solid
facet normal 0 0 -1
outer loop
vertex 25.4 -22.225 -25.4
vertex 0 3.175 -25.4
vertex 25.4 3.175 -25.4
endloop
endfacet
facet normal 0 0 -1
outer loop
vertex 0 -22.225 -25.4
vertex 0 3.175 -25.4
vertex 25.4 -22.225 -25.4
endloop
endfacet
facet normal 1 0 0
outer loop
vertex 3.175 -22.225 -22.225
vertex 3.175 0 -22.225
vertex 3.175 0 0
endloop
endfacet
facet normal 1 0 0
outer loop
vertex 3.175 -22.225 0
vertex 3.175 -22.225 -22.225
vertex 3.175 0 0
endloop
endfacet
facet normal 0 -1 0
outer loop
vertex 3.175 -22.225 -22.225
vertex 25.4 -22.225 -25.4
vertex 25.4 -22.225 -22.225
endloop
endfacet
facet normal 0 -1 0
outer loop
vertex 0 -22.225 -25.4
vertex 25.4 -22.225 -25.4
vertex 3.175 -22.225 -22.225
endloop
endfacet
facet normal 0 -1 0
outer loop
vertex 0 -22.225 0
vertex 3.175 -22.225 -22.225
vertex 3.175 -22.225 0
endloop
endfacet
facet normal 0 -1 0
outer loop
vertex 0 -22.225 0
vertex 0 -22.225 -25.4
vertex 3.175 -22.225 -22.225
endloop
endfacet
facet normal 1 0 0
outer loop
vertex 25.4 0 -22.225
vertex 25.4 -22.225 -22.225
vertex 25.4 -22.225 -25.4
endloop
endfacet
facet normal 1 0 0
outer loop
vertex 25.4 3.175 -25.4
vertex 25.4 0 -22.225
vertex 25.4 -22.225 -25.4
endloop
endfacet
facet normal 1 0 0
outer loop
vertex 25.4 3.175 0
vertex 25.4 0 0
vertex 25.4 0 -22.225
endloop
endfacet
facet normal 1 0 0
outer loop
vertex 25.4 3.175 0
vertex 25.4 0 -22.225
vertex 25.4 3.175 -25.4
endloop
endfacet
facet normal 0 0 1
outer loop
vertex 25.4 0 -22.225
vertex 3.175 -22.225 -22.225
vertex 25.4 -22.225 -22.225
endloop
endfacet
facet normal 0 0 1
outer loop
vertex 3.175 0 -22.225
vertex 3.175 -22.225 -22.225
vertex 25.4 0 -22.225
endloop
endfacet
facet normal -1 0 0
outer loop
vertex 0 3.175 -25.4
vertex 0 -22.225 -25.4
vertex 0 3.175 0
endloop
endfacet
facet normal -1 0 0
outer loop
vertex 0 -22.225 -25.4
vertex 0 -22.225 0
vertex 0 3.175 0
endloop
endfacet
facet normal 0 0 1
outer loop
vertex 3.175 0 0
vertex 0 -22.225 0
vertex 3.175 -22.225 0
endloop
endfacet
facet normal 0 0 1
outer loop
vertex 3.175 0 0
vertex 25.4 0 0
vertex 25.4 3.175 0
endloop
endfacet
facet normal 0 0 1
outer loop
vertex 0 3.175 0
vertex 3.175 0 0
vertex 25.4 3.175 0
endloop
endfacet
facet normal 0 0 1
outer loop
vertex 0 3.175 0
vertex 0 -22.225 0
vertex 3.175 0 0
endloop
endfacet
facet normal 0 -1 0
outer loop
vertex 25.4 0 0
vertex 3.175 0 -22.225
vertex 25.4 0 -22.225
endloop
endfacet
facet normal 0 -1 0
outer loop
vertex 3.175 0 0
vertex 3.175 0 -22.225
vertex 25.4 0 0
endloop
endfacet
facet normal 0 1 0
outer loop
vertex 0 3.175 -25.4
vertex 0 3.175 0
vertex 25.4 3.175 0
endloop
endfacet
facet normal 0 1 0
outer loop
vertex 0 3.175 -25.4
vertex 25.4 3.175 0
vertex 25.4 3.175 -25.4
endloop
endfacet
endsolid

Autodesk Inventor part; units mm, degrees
ref_plane "YZ Plane" through (0, 0, 0) normal (1, 0, 0) x (0, 1, 0)
ref_plane "XZ Plane" through (0, 0, 0) normal (0, 1, 0) x (-1, 0, 0)
ref_plane "XY Plane" through (0, 0, 0) normal (0, 0, 1) x (1, 0, 0)
sketch "Sketch1" plane through (0, 0, 0) normal (1, 0, 0) x (0, 1, 0)
  line L0 (0, 0) -> (3.175, 0)
  line L1 (3.175, 0) -> (3.175, -25.4)
  line L2 (3.175, -25.4) -> (-22.225, -25.4)
  line L3 (-22.225, -25.4) -> (-22.225, -22.225)
  line L4 (-22.225, -22.225) -> (0, -22.225)
  line L5 (0, -22.225) -> (0, 0)
  dimension "d0" = 3.175
  dimension "d1" = 3.175
  dimension "d2" = 25.4
  dimension "d3" = 25.4
extrude "Extrusion1" add sketch "Sketch1" along normal blind 25.4
sketch "Sketch2" plane through (0, 0, 0) normal (-1, 0, 0) x (0, 0, 1)
  line L0 (-25.4, -22.225) -> (-25.4, 3.175) projected
  line L1 (-25.4, 3.175) -> (0, 3.175)
  line L2 (0, 3.175) -> (0, -22.225)
  line L3 (0, -22.225) -> (-25.4, -22.225)
  line L4 (-25.4, -22.225) -> (-25.4, 3.175)
  line L5 (-25.4, -22.225) -> (-22.225, -22.225) projected
  point P0 (0, 0)
extrude "Extrusion2" add sketch "Sketch2" against normal blind 3.175
properties part number "gusset_plate_corner"
